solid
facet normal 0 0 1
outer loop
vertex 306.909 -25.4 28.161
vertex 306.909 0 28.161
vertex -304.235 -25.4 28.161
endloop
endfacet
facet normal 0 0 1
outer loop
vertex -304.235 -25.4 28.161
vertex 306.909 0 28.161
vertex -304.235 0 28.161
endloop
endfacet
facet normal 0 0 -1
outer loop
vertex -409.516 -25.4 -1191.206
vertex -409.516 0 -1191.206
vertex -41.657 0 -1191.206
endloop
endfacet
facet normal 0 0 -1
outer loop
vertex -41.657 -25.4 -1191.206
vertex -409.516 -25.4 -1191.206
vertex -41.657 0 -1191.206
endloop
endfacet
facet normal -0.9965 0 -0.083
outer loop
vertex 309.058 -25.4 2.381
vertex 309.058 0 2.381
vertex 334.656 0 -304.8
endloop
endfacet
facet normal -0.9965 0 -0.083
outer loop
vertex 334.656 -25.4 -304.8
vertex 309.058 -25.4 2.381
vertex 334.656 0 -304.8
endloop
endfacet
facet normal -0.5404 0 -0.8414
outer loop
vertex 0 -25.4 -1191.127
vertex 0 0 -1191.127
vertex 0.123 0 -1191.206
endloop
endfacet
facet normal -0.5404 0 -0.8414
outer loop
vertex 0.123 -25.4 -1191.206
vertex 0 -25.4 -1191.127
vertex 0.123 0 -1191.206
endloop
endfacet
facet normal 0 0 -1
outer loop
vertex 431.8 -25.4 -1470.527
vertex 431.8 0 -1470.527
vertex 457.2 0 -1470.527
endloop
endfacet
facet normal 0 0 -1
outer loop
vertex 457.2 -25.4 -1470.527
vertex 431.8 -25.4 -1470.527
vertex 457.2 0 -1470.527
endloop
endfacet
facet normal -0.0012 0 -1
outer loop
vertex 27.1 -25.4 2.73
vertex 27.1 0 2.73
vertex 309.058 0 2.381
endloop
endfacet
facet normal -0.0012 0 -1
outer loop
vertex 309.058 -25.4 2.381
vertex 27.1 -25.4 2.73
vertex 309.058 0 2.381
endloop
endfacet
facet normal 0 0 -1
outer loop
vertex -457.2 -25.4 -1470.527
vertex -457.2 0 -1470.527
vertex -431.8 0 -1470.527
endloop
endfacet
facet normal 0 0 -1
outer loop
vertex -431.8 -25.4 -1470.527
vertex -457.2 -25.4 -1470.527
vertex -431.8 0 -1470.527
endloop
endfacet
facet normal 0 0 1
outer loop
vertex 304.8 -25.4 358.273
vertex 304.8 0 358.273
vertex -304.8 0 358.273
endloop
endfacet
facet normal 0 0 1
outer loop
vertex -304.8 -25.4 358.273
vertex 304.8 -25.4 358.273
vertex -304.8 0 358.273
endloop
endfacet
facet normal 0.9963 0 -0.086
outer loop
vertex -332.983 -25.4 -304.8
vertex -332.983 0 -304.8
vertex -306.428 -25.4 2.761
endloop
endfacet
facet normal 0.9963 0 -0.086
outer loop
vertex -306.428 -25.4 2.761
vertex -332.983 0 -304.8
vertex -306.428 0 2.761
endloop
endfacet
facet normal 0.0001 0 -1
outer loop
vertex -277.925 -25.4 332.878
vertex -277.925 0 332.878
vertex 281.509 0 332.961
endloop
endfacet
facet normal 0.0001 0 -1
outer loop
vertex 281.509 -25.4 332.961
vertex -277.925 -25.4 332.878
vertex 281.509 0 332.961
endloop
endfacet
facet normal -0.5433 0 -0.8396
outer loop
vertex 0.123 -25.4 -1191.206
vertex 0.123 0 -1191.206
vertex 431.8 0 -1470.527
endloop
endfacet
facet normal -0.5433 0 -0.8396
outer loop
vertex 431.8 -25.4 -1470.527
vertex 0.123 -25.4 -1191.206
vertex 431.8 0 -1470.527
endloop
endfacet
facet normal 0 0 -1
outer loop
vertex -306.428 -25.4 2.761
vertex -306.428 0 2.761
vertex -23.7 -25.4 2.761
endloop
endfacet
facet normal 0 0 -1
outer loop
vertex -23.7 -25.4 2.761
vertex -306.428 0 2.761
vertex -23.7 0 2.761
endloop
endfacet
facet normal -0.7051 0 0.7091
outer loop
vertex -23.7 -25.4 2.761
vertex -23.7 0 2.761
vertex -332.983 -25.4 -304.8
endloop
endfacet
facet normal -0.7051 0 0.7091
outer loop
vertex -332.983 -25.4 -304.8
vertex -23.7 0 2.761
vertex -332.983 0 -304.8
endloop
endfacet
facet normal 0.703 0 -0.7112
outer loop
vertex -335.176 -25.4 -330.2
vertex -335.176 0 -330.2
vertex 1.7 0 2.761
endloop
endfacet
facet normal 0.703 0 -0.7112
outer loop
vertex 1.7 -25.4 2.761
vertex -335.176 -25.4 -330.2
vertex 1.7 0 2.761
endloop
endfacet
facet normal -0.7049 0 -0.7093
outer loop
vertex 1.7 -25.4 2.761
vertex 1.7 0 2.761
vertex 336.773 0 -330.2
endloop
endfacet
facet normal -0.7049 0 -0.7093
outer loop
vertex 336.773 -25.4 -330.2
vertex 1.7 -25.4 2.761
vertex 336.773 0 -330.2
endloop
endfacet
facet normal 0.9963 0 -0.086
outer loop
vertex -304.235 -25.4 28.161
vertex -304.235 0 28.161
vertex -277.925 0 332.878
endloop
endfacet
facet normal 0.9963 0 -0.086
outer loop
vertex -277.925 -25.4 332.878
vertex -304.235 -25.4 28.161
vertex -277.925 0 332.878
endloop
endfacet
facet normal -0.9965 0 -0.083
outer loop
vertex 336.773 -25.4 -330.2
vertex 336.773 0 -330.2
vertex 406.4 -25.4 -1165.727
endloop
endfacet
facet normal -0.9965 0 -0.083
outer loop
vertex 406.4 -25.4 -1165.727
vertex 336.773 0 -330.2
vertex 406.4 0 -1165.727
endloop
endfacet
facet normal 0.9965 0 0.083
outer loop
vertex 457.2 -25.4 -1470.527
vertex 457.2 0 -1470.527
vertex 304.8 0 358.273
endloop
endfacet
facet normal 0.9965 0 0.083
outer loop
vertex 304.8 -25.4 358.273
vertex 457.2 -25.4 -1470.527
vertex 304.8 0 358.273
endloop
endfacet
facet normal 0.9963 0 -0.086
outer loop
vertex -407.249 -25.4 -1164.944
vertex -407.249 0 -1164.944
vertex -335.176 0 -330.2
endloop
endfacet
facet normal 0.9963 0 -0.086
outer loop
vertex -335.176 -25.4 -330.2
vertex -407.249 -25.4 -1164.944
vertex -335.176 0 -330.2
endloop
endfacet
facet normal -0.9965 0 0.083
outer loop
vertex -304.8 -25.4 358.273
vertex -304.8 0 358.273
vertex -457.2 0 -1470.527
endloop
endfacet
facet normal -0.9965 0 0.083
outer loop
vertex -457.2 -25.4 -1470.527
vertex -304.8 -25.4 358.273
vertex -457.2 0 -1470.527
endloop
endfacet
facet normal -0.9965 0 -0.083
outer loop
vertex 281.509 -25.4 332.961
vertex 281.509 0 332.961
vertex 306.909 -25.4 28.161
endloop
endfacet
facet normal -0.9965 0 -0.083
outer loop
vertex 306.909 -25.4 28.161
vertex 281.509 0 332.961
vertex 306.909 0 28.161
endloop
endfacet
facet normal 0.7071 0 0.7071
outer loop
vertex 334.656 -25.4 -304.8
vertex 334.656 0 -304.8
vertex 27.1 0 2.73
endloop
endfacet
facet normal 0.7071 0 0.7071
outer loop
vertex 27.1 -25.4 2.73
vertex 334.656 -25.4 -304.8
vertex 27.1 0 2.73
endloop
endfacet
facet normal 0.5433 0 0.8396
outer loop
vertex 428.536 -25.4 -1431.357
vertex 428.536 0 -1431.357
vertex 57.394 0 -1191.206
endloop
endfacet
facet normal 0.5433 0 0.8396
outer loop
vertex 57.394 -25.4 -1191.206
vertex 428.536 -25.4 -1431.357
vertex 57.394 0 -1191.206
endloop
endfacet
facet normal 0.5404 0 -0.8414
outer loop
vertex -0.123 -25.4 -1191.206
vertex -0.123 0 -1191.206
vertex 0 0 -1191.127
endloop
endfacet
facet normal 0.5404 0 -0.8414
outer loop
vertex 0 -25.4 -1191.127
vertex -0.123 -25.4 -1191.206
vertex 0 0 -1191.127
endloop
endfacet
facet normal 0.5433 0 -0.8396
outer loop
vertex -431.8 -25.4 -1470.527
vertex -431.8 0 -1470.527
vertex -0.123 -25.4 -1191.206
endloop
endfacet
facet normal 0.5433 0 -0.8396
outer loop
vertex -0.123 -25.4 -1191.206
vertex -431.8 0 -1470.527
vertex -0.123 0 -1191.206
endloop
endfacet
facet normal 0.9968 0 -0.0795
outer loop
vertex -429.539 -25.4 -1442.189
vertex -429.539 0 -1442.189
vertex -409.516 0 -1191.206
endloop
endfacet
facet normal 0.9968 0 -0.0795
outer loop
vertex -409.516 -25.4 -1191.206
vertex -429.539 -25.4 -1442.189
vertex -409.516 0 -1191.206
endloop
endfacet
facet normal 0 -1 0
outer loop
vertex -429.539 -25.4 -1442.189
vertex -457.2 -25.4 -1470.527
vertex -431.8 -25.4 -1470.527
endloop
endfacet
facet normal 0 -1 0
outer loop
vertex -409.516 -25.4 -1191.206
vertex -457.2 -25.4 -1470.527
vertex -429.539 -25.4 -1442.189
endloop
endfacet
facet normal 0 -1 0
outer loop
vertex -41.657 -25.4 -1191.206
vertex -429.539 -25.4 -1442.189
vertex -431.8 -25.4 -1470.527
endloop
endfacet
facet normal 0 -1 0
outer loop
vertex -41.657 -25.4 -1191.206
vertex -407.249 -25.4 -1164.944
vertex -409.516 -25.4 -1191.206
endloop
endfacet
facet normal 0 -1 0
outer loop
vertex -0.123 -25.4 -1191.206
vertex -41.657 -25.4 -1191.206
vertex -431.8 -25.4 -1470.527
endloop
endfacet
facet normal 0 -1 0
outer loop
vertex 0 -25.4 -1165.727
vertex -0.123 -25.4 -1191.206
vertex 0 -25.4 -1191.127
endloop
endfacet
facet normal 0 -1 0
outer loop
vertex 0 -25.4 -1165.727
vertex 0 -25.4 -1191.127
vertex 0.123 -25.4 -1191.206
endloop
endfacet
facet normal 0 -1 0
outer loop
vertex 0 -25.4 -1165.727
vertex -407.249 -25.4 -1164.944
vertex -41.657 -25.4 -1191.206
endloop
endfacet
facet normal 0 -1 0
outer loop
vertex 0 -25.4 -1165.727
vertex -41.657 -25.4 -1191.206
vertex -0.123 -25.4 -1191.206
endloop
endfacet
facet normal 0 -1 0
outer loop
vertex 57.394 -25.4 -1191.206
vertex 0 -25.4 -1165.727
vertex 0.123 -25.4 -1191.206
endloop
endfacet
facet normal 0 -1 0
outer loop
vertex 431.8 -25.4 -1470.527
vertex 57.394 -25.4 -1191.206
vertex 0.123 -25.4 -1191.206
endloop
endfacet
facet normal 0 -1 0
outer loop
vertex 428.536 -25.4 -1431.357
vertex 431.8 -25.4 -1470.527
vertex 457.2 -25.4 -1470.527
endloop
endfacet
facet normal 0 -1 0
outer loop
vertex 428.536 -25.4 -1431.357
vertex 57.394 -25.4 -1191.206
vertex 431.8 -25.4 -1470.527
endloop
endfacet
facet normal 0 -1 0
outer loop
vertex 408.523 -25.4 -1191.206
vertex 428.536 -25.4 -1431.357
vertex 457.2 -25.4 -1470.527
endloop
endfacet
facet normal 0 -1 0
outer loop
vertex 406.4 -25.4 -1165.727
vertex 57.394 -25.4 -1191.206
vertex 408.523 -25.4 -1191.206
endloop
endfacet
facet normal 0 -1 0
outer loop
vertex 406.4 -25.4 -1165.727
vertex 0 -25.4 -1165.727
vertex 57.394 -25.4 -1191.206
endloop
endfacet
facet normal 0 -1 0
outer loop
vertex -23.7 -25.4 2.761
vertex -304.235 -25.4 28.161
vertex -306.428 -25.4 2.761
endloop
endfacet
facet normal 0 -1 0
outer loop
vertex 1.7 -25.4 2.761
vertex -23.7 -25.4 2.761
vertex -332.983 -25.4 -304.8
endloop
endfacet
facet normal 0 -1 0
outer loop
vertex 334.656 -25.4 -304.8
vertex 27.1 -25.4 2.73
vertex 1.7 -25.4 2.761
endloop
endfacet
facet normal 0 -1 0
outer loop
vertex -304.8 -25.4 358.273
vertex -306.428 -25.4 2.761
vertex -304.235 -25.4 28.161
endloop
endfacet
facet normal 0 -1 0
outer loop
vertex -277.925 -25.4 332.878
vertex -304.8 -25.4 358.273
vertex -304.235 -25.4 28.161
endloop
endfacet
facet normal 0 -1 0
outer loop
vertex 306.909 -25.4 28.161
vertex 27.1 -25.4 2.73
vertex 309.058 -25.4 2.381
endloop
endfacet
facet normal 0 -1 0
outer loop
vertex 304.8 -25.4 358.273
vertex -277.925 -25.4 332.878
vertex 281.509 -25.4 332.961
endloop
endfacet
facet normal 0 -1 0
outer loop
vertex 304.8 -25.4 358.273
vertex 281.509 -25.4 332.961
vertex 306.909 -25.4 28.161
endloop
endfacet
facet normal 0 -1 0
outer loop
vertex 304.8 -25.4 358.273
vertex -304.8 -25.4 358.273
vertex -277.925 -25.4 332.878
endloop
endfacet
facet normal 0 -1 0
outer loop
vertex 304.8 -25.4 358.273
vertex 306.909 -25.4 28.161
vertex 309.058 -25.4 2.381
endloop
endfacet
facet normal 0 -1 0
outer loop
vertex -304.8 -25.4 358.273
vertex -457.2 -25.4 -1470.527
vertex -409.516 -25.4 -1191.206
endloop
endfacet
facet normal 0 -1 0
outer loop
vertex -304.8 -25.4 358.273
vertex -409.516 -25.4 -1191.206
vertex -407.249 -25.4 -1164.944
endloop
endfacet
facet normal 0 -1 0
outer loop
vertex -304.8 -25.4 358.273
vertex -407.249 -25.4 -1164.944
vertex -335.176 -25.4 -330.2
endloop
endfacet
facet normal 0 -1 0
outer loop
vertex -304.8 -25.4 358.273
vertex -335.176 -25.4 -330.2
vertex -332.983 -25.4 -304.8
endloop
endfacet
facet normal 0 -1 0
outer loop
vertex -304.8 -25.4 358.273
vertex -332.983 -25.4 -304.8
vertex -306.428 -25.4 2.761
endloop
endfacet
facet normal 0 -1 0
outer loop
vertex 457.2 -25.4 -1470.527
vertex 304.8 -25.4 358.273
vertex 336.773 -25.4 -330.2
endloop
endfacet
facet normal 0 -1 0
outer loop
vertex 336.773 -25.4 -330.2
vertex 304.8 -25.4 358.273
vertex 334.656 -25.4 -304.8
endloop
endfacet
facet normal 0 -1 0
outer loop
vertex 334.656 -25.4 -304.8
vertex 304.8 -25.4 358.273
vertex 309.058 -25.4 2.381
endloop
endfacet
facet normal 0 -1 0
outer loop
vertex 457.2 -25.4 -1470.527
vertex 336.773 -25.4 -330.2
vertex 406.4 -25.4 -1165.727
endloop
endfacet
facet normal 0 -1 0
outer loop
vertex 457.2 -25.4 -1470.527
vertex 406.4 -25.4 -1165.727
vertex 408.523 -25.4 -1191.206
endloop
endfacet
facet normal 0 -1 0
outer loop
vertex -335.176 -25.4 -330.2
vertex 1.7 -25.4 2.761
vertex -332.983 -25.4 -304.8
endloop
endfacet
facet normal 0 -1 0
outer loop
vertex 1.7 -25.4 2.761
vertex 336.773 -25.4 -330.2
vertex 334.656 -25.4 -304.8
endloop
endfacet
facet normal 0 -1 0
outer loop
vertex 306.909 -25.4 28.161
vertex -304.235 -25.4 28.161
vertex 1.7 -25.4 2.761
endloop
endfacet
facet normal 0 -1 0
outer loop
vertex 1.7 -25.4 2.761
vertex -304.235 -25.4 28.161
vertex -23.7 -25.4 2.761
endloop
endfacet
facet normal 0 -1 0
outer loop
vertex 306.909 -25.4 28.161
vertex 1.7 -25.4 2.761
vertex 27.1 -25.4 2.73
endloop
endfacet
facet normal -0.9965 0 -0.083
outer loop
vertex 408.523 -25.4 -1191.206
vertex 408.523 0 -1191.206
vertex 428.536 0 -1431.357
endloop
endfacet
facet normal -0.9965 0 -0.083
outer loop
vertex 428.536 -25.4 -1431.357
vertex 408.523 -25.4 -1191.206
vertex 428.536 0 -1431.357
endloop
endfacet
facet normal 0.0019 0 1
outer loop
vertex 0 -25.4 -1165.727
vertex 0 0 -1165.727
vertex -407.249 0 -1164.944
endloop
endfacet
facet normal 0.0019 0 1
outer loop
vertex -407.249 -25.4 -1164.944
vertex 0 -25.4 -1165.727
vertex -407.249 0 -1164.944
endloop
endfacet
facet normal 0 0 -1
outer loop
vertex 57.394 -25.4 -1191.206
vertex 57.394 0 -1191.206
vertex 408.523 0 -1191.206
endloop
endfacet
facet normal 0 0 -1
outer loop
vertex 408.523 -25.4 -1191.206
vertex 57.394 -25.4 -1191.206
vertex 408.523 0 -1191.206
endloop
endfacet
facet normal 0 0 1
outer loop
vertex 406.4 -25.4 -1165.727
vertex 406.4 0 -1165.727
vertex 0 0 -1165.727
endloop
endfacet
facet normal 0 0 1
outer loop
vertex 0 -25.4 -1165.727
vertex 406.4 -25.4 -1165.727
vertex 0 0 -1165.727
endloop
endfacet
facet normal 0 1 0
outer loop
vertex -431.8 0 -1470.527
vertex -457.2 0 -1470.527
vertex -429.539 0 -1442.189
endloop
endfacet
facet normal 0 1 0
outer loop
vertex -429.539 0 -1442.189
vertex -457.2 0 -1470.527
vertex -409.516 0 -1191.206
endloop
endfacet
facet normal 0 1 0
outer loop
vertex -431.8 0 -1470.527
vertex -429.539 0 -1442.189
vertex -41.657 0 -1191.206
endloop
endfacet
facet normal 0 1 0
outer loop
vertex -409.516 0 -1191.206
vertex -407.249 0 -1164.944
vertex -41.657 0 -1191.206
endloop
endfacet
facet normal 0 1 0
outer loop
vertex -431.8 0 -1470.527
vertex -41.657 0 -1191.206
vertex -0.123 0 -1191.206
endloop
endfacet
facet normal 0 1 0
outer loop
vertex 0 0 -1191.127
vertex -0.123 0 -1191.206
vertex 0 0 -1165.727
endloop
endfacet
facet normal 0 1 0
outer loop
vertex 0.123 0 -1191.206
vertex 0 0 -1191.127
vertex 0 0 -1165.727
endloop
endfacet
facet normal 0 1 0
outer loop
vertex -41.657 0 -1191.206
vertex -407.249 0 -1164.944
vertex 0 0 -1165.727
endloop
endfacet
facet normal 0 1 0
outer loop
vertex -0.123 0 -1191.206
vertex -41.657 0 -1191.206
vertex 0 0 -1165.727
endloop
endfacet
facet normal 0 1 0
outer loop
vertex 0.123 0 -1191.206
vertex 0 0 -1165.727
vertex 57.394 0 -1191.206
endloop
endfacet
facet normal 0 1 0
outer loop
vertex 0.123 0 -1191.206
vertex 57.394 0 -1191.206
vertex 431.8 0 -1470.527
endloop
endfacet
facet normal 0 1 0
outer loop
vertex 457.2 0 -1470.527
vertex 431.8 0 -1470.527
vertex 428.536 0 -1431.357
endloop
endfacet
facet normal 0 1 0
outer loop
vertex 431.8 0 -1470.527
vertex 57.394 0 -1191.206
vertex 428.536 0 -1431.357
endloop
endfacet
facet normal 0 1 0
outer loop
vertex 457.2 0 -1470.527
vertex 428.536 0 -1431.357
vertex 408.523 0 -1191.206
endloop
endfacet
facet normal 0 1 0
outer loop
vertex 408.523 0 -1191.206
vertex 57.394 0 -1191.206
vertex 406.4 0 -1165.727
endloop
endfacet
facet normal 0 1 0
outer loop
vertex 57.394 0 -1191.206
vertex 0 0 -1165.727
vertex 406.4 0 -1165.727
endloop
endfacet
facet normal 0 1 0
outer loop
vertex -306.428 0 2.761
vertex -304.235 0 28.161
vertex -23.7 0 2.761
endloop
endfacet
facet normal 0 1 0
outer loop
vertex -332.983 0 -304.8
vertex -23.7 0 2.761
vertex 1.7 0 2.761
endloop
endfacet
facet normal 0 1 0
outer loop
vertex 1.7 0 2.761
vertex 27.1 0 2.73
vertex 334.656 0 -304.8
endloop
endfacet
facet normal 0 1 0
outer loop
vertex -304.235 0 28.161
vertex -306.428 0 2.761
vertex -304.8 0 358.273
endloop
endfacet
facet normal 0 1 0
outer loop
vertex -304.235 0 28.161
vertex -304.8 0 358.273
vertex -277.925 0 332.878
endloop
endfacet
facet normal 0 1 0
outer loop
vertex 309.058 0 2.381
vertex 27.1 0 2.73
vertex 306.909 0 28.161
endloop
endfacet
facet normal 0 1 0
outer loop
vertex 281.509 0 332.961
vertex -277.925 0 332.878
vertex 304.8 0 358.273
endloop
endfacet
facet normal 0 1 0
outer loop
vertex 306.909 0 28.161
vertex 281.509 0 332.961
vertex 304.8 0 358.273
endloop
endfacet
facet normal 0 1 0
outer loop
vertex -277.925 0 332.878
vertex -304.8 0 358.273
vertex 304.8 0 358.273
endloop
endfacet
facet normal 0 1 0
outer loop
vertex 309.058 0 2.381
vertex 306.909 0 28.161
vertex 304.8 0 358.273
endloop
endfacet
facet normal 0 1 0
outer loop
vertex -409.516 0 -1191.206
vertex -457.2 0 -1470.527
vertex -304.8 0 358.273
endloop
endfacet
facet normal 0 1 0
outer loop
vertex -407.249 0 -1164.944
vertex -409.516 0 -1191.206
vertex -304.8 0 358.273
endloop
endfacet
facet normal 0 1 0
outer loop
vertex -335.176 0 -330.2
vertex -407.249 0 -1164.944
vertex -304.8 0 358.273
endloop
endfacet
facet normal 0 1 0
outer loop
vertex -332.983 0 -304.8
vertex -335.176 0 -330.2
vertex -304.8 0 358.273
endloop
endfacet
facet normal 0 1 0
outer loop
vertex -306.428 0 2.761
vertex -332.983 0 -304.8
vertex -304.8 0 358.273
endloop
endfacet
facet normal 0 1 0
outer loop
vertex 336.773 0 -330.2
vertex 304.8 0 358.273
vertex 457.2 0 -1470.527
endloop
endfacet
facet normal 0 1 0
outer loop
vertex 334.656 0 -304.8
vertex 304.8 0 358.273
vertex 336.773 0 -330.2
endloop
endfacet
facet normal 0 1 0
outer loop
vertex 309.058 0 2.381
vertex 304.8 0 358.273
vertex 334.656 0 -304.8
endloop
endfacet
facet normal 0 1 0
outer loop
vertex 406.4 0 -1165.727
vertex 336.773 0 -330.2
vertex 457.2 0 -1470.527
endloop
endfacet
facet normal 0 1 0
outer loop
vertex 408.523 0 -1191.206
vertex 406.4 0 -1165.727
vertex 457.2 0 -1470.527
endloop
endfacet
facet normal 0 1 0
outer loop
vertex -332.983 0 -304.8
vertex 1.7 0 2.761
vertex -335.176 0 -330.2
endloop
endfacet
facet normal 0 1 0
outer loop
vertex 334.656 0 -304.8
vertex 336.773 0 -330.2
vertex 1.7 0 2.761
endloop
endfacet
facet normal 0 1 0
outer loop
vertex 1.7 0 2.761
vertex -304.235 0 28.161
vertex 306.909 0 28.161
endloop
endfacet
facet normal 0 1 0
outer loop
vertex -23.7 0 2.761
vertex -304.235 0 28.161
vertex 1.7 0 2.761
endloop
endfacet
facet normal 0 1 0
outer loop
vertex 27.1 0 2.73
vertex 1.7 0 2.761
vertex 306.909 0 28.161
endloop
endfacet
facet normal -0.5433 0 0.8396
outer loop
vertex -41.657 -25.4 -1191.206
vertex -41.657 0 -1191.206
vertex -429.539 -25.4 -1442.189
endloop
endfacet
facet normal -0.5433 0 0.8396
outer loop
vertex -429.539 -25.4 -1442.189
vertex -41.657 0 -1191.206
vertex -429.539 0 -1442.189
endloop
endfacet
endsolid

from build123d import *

# Parameters (mm, degrees)
F1_DEPTH = 25.4


# Not quite as in the source:
# - a feature names something its author has since deleted; it is built from what else it names


with BuildPart() as f1:
    # F0 (on Front) → F1 (new body)
    with BuildSketch(Plane.XZ):
        Polygon((0, 358.2734752655), (-304.8, 358.2734752655), (-457.2, -1470.5265247345), (-431.8, -1470.5265247337), (-0.1234569215, -1191.2064086248), (-1e-10, -1191.1265247345), (0.1234569213, -1191.2064086248), (431.8, -1470.5265247345), (457.2, -1470.5265247345), (304.8, 358.2734752655), align=None)
        Polygon((-429.5392940648, -1442.1890979106), (-409.5163731819, -1191.2064086248), (-41.6569560767, -1191.2064086248), align=None, mode=Mode.SUBTRACT)
        Polygon((0, -1165.7265247345), (-407.2488822076, -1164.9444627713), (-335.1759464959, -330.2), (1.7004121065, 2.7614467587), (336.7727896055, -330.2), (406.4, -1165.7265247345), align=None, mode=Mode.SUBTRACT)
        Polygon((57.3942214249, -1191.2064086248), (408.5233236575, -1191.2064086248), (428.535863163, -1431.3568826906), align=None, mode=Mode.SUBTRACT)
        Polygon((-23.6995878935, 2.7614467587), (-332.9828770612, -304.8), (-306.4276168969, 2.7614467587), align=None, mode=Mode.SUBTRACT)
        Polygon((334.6561229388, -304.8), (27.1003926271, 2.7299896004), (309.0577234879, 2.380793411), align=None, mode=Mode.SUBTRACT)
        Polygon((-277.9249521719, 332.8776175298), (281.5093551883, 332.9612130061), (306.9093551883, 28.1612130061), (-304.2345555955, 28.1613525589), align=None, mode=Mode.SUBTRACT)
    extrude(amount=F1_DEPTH)


solid = f1.part
